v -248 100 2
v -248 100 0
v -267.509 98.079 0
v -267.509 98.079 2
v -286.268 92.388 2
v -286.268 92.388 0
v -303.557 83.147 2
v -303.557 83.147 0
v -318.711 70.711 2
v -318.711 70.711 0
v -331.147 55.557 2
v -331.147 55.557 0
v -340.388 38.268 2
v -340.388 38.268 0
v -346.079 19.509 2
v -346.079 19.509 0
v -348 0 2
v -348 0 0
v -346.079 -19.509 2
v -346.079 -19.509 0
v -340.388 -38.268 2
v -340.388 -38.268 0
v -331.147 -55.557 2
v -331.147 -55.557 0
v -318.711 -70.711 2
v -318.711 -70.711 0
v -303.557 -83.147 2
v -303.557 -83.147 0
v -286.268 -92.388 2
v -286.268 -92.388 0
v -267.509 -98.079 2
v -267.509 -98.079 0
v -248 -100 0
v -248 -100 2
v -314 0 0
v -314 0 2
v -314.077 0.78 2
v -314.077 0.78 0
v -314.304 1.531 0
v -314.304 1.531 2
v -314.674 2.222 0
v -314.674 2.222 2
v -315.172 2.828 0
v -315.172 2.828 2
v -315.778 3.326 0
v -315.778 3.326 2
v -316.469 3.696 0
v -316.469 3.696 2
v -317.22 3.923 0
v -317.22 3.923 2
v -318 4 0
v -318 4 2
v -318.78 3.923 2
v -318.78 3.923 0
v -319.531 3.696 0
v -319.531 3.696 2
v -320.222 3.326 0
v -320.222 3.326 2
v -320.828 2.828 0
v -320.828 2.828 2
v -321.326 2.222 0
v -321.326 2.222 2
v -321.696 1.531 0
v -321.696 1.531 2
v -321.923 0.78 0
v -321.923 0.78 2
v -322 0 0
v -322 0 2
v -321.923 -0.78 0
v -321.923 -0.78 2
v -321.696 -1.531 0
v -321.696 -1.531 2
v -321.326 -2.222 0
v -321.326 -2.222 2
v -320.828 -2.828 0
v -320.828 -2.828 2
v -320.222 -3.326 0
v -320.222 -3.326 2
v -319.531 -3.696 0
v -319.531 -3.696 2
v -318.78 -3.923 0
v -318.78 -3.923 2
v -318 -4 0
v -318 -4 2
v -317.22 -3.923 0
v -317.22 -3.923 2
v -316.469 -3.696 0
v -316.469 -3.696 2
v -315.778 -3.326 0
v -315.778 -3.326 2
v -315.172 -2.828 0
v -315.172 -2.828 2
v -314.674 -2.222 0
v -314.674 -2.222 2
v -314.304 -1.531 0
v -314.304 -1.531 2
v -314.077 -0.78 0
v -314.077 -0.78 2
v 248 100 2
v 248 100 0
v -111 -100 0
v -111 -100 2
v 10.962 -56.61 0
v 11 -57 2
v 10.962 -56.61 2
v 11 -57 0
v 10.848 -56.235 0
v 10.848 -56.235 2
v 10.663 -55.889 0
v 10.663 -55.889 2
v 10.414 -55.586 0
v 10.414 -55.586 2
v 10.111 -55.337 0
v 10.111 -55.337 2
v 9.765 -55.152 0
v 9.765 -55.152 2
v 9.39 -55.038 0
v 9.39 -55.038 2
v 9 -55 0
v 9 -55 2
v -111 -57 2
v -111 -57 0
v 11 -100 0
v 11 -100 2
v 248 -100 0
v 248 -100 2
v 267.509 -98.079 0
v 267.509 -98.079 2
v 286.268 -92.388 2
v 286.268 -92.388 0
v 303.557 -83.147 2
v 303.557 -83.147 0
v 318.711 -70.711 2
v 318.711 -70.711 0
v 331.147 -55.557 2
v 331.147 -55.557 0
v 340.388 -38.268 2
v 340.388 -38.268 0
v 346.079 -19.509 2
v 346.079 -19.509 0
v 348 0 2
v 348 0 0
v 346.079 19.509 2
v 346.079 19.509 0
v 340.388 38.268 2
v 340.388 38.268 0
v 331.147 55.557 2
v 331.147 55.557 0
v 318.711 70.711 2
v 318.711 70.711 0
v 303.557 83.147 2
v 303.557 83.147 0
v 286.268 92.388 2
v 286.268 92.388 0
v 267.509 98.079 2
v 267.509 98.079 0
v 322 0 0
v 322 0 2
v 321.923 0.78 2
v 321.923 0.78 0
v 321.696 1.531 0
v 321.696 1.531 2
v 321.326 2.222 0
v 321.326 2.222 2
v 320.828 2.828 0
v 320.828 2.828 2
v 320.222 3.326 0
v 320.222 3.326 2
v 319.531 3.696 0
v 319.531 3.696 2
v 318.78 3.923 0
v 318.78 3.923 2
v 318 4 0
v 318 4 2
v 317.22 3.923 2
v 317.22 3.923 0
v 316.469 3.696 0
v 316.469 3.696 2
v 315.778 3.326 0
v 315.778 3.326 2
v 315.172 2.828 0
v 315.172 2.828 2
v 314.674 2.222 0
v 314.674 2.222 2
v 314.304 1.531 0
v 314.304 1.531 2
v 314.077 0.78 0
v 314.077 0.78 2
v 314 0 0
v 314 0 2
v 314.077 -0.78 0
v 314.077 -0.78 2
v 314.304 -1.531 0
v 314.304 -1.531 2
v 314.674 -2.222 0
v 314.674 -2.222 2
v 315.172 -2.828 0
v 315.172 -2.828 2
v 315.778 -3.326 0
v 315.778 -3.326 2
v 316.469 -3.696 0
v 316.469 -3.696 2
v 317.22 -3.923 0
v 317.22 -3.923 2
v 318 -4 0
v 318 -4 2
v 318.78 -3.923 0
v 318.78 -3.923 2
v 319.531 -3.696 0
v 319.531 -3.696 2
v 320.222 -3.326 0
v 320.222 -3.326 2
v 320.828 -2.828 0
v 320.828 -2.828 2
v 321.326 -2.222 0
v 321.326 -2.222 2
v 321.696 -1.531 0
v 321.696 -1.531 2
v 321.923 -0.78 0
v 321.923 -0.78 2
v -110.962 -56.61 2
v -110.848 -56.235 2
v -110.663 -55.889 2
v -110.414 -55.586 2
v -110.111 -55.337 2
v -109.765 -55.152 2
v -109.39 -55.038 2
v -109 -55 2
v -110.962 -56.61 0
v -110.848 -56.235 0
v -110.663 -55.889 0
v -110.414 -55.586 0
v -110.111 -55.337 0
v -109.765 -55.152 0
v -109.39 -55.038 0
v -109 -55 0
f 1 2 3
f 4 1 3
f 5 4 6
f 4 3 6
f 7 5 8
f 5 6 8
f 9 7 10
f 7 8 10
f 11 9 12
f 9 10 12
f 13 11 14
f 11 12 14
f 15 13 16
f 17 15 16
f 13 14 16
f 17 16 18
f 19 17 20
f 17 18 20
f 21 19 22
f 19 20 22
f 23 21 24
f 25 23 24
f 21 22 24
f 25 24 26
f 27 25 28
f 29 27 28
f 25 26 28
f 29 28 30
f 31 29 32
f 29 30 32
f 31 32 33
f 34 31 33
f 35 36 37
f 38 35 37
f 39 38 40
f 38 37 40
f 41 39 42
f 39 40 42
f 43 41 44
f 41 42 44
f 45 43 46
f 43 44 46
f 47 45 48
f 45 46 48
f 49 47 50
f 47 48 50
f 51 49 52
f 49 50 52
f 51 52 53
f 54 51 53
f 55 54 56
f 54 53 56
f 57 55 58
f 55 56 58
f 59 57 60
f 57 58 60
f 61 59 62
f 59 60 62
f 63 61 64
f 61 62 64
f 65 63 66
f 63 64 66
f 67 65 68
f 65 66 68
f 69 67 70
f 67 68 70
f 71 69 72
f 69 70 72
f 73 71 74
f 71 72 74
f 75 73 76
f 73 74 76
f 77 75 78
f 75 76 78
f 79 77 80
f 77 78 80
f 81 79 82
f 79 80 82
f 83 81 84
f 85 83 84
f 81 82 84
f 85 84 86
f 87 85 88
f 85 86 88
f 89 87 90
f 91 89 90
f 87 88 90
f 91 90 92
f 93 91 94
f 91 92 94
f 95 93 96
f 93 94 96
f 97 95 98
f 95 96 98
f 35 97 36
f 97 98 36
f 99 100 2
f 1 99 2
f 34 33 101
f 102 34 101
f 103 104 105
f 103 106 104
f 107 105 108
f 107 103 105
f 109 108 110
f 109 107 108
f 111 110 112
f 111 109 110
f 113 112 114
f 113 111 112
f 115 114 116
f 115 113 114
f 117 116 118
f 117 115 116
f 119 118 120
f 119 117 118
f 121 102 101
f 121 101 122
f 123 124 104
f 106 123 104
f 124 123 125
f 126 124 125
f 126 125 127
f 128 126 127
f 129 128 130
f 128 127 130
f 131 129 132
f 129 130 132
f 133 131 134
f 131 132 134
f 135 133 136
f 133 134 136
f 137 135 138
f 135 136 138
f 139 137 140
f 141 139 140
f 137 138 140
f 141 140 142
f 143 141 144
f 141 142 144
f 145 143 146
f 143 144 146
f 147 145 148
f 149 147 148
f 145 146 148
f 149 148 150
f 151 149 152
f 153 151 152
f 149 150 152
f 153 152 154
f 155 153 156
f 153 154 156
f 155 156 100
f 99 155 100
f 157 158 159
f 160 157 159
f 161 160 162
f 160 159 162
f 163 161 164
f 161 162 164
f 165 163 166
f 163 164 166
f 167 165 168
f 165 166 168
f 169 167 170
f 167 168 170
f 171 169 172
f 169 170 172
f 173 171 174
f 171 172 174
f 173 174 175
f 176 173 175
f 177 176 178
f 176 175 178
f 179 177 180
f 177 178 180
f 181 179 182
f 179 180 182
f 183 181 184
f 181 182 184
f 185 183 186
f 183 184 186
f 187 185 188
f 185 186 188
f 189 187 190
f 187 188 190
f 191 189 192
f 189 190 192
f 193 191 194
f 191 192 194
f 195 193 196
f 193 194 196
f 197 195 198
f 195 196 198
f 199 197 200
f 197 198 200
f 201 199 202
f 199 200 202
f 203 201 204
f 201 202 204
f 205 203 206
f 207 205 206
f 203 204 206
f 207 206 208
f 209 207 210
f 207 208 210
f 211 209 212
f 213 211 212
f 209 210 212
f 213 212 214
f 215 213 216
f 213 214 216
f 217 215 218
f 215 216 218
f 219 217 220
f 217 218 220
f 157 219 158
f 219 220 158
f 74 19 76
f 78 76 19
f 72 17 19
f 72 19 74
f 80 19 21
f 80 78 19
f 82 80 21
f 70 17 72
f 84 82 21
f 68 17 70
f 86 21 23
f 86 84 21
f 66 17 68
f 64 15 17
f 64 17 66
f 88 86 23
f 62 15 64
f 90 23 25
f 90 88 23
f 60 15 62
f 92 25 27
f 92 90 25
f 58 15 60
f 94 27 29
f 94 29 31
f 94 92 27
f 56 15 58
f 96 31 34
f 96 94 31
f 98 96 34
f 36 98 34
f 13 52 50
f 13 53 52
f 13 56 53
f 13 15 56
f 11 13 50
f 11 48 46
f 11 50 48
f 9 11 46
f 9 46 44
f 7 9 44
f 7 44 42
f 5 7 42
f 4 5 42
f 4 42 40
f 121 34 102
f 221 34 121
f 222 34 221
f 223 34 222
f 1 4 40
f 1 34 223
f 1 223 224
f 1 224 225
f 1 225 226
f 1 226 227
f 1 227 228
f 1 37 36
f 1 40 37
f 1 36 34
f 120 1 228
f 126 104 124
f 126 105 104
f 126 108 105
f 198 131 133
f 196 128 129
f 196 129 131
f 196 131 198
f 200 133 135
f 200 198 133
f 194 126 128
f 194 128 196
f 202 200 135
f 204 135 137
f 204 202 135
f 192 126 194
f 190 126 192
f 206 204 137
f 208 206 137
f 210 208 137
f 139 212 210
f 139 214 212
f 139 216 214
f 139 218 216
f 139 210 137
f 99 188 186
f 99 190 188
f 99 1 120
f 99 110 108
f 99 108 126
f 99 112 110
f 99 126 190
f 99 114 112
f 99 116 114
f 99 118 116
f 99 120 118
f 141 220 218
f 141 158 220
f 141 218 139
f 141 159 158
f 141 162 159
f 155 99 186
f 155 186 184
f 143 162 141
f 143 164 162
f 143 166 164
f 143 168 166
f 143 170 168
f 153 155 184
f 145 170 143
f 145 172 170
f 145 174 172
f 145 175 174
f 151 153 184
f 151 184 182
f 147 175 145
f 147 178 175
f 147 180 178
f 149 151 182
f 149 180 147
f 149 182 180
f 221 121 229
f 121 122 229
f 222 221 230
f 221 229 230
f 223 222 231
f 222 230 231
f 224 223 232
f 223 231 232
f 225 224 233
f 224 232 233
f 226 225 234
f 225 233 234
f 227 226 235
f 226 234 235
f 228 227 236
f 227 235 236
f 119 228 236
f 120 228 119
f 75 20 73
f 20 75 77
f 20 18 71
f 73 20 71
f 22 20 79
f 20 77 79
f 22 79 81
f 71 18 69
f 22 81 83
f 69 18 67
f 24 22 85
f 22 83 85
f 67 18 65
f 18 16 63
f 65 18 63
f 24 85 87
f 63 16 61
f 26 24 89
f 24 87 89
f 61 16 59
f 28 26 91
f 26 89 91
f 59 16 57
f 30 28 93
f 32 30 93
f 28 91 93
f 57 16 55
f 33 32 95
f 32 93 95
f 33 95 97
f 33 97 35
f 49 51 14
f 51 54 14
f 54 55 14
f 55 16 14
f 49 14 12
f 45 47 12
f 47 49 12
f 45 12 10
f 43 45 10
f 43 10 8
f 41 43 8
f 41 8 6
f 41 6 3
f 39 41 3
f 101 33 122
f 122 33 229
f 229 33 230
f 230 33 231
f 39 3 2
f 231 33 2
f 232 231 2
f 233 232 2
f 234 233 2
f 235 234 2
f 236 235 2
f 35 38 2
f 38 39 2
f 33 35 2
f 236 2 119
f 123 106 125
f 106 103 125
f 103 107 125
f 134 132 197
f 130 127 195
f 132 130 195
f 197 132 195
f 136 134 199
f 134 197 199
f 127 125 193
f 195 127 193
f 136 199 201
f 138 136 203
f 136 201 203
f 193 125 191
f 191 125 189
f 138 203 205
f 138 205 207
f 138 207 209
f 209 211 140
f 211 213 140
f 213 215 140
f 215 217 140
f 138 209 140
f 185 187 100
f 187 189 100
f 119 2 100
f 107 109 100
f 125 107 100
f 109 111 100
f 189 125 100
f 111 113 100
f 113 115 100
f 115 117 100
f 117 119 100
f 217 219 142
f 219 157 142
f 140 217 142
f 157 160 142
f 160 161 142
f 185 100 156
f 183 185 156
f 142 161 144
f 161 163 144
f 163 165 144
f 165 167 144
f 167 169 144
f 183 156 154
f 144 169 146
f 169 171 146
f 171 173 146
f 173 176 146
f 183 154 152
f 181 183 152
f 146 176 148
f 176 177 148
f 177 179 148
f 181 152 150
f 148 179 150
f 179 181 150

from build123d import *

# Parameters (mm, degrees)
F1_DEPTH = 2
F2_R     = 4
F2_W     = 122
F2_H     = 45
F3_DEPTH = 2
F4_R     = 2


with BuildPart() as f1:
    # F0 (on Top) → F1 (new body)
    with BuildSketch(Plane.XY):
        with BuildLine():
            Line((-248, -100), (248, -100))
            ThreePointArc((248, -100), (348, 0), (248, 100))
            Line((248, 100), (-248, 100))
            ThreePointArc((-248, 100), (-348, 0), (-248, -100))
        make_face()
    extrude(amount=F1_DEPTH)

    # F2 (on face) → F3 (cut, through all)
    with BuildSketch(Plane.XY.offset(2)):
        with Locations((318, 0)):
            Circle(F2_R)
        with Locations((-318, 0)):
            Circle(F2_R)
        with Locations((-50, -77.5)):
            Rectangle(F2_W, F2_H)
    extrude(amount=-F3_DEPTH, mode=Mode.SUBTRACT)

    # F4
    f4_edges = [f1.edges().sort_by_distance(p)[0] for p in [
        (11, -55, 1),
        (-111, -55, 1),
    ]]
    fillet(f4_edges, radius=F4_R)


solid = f1.part
